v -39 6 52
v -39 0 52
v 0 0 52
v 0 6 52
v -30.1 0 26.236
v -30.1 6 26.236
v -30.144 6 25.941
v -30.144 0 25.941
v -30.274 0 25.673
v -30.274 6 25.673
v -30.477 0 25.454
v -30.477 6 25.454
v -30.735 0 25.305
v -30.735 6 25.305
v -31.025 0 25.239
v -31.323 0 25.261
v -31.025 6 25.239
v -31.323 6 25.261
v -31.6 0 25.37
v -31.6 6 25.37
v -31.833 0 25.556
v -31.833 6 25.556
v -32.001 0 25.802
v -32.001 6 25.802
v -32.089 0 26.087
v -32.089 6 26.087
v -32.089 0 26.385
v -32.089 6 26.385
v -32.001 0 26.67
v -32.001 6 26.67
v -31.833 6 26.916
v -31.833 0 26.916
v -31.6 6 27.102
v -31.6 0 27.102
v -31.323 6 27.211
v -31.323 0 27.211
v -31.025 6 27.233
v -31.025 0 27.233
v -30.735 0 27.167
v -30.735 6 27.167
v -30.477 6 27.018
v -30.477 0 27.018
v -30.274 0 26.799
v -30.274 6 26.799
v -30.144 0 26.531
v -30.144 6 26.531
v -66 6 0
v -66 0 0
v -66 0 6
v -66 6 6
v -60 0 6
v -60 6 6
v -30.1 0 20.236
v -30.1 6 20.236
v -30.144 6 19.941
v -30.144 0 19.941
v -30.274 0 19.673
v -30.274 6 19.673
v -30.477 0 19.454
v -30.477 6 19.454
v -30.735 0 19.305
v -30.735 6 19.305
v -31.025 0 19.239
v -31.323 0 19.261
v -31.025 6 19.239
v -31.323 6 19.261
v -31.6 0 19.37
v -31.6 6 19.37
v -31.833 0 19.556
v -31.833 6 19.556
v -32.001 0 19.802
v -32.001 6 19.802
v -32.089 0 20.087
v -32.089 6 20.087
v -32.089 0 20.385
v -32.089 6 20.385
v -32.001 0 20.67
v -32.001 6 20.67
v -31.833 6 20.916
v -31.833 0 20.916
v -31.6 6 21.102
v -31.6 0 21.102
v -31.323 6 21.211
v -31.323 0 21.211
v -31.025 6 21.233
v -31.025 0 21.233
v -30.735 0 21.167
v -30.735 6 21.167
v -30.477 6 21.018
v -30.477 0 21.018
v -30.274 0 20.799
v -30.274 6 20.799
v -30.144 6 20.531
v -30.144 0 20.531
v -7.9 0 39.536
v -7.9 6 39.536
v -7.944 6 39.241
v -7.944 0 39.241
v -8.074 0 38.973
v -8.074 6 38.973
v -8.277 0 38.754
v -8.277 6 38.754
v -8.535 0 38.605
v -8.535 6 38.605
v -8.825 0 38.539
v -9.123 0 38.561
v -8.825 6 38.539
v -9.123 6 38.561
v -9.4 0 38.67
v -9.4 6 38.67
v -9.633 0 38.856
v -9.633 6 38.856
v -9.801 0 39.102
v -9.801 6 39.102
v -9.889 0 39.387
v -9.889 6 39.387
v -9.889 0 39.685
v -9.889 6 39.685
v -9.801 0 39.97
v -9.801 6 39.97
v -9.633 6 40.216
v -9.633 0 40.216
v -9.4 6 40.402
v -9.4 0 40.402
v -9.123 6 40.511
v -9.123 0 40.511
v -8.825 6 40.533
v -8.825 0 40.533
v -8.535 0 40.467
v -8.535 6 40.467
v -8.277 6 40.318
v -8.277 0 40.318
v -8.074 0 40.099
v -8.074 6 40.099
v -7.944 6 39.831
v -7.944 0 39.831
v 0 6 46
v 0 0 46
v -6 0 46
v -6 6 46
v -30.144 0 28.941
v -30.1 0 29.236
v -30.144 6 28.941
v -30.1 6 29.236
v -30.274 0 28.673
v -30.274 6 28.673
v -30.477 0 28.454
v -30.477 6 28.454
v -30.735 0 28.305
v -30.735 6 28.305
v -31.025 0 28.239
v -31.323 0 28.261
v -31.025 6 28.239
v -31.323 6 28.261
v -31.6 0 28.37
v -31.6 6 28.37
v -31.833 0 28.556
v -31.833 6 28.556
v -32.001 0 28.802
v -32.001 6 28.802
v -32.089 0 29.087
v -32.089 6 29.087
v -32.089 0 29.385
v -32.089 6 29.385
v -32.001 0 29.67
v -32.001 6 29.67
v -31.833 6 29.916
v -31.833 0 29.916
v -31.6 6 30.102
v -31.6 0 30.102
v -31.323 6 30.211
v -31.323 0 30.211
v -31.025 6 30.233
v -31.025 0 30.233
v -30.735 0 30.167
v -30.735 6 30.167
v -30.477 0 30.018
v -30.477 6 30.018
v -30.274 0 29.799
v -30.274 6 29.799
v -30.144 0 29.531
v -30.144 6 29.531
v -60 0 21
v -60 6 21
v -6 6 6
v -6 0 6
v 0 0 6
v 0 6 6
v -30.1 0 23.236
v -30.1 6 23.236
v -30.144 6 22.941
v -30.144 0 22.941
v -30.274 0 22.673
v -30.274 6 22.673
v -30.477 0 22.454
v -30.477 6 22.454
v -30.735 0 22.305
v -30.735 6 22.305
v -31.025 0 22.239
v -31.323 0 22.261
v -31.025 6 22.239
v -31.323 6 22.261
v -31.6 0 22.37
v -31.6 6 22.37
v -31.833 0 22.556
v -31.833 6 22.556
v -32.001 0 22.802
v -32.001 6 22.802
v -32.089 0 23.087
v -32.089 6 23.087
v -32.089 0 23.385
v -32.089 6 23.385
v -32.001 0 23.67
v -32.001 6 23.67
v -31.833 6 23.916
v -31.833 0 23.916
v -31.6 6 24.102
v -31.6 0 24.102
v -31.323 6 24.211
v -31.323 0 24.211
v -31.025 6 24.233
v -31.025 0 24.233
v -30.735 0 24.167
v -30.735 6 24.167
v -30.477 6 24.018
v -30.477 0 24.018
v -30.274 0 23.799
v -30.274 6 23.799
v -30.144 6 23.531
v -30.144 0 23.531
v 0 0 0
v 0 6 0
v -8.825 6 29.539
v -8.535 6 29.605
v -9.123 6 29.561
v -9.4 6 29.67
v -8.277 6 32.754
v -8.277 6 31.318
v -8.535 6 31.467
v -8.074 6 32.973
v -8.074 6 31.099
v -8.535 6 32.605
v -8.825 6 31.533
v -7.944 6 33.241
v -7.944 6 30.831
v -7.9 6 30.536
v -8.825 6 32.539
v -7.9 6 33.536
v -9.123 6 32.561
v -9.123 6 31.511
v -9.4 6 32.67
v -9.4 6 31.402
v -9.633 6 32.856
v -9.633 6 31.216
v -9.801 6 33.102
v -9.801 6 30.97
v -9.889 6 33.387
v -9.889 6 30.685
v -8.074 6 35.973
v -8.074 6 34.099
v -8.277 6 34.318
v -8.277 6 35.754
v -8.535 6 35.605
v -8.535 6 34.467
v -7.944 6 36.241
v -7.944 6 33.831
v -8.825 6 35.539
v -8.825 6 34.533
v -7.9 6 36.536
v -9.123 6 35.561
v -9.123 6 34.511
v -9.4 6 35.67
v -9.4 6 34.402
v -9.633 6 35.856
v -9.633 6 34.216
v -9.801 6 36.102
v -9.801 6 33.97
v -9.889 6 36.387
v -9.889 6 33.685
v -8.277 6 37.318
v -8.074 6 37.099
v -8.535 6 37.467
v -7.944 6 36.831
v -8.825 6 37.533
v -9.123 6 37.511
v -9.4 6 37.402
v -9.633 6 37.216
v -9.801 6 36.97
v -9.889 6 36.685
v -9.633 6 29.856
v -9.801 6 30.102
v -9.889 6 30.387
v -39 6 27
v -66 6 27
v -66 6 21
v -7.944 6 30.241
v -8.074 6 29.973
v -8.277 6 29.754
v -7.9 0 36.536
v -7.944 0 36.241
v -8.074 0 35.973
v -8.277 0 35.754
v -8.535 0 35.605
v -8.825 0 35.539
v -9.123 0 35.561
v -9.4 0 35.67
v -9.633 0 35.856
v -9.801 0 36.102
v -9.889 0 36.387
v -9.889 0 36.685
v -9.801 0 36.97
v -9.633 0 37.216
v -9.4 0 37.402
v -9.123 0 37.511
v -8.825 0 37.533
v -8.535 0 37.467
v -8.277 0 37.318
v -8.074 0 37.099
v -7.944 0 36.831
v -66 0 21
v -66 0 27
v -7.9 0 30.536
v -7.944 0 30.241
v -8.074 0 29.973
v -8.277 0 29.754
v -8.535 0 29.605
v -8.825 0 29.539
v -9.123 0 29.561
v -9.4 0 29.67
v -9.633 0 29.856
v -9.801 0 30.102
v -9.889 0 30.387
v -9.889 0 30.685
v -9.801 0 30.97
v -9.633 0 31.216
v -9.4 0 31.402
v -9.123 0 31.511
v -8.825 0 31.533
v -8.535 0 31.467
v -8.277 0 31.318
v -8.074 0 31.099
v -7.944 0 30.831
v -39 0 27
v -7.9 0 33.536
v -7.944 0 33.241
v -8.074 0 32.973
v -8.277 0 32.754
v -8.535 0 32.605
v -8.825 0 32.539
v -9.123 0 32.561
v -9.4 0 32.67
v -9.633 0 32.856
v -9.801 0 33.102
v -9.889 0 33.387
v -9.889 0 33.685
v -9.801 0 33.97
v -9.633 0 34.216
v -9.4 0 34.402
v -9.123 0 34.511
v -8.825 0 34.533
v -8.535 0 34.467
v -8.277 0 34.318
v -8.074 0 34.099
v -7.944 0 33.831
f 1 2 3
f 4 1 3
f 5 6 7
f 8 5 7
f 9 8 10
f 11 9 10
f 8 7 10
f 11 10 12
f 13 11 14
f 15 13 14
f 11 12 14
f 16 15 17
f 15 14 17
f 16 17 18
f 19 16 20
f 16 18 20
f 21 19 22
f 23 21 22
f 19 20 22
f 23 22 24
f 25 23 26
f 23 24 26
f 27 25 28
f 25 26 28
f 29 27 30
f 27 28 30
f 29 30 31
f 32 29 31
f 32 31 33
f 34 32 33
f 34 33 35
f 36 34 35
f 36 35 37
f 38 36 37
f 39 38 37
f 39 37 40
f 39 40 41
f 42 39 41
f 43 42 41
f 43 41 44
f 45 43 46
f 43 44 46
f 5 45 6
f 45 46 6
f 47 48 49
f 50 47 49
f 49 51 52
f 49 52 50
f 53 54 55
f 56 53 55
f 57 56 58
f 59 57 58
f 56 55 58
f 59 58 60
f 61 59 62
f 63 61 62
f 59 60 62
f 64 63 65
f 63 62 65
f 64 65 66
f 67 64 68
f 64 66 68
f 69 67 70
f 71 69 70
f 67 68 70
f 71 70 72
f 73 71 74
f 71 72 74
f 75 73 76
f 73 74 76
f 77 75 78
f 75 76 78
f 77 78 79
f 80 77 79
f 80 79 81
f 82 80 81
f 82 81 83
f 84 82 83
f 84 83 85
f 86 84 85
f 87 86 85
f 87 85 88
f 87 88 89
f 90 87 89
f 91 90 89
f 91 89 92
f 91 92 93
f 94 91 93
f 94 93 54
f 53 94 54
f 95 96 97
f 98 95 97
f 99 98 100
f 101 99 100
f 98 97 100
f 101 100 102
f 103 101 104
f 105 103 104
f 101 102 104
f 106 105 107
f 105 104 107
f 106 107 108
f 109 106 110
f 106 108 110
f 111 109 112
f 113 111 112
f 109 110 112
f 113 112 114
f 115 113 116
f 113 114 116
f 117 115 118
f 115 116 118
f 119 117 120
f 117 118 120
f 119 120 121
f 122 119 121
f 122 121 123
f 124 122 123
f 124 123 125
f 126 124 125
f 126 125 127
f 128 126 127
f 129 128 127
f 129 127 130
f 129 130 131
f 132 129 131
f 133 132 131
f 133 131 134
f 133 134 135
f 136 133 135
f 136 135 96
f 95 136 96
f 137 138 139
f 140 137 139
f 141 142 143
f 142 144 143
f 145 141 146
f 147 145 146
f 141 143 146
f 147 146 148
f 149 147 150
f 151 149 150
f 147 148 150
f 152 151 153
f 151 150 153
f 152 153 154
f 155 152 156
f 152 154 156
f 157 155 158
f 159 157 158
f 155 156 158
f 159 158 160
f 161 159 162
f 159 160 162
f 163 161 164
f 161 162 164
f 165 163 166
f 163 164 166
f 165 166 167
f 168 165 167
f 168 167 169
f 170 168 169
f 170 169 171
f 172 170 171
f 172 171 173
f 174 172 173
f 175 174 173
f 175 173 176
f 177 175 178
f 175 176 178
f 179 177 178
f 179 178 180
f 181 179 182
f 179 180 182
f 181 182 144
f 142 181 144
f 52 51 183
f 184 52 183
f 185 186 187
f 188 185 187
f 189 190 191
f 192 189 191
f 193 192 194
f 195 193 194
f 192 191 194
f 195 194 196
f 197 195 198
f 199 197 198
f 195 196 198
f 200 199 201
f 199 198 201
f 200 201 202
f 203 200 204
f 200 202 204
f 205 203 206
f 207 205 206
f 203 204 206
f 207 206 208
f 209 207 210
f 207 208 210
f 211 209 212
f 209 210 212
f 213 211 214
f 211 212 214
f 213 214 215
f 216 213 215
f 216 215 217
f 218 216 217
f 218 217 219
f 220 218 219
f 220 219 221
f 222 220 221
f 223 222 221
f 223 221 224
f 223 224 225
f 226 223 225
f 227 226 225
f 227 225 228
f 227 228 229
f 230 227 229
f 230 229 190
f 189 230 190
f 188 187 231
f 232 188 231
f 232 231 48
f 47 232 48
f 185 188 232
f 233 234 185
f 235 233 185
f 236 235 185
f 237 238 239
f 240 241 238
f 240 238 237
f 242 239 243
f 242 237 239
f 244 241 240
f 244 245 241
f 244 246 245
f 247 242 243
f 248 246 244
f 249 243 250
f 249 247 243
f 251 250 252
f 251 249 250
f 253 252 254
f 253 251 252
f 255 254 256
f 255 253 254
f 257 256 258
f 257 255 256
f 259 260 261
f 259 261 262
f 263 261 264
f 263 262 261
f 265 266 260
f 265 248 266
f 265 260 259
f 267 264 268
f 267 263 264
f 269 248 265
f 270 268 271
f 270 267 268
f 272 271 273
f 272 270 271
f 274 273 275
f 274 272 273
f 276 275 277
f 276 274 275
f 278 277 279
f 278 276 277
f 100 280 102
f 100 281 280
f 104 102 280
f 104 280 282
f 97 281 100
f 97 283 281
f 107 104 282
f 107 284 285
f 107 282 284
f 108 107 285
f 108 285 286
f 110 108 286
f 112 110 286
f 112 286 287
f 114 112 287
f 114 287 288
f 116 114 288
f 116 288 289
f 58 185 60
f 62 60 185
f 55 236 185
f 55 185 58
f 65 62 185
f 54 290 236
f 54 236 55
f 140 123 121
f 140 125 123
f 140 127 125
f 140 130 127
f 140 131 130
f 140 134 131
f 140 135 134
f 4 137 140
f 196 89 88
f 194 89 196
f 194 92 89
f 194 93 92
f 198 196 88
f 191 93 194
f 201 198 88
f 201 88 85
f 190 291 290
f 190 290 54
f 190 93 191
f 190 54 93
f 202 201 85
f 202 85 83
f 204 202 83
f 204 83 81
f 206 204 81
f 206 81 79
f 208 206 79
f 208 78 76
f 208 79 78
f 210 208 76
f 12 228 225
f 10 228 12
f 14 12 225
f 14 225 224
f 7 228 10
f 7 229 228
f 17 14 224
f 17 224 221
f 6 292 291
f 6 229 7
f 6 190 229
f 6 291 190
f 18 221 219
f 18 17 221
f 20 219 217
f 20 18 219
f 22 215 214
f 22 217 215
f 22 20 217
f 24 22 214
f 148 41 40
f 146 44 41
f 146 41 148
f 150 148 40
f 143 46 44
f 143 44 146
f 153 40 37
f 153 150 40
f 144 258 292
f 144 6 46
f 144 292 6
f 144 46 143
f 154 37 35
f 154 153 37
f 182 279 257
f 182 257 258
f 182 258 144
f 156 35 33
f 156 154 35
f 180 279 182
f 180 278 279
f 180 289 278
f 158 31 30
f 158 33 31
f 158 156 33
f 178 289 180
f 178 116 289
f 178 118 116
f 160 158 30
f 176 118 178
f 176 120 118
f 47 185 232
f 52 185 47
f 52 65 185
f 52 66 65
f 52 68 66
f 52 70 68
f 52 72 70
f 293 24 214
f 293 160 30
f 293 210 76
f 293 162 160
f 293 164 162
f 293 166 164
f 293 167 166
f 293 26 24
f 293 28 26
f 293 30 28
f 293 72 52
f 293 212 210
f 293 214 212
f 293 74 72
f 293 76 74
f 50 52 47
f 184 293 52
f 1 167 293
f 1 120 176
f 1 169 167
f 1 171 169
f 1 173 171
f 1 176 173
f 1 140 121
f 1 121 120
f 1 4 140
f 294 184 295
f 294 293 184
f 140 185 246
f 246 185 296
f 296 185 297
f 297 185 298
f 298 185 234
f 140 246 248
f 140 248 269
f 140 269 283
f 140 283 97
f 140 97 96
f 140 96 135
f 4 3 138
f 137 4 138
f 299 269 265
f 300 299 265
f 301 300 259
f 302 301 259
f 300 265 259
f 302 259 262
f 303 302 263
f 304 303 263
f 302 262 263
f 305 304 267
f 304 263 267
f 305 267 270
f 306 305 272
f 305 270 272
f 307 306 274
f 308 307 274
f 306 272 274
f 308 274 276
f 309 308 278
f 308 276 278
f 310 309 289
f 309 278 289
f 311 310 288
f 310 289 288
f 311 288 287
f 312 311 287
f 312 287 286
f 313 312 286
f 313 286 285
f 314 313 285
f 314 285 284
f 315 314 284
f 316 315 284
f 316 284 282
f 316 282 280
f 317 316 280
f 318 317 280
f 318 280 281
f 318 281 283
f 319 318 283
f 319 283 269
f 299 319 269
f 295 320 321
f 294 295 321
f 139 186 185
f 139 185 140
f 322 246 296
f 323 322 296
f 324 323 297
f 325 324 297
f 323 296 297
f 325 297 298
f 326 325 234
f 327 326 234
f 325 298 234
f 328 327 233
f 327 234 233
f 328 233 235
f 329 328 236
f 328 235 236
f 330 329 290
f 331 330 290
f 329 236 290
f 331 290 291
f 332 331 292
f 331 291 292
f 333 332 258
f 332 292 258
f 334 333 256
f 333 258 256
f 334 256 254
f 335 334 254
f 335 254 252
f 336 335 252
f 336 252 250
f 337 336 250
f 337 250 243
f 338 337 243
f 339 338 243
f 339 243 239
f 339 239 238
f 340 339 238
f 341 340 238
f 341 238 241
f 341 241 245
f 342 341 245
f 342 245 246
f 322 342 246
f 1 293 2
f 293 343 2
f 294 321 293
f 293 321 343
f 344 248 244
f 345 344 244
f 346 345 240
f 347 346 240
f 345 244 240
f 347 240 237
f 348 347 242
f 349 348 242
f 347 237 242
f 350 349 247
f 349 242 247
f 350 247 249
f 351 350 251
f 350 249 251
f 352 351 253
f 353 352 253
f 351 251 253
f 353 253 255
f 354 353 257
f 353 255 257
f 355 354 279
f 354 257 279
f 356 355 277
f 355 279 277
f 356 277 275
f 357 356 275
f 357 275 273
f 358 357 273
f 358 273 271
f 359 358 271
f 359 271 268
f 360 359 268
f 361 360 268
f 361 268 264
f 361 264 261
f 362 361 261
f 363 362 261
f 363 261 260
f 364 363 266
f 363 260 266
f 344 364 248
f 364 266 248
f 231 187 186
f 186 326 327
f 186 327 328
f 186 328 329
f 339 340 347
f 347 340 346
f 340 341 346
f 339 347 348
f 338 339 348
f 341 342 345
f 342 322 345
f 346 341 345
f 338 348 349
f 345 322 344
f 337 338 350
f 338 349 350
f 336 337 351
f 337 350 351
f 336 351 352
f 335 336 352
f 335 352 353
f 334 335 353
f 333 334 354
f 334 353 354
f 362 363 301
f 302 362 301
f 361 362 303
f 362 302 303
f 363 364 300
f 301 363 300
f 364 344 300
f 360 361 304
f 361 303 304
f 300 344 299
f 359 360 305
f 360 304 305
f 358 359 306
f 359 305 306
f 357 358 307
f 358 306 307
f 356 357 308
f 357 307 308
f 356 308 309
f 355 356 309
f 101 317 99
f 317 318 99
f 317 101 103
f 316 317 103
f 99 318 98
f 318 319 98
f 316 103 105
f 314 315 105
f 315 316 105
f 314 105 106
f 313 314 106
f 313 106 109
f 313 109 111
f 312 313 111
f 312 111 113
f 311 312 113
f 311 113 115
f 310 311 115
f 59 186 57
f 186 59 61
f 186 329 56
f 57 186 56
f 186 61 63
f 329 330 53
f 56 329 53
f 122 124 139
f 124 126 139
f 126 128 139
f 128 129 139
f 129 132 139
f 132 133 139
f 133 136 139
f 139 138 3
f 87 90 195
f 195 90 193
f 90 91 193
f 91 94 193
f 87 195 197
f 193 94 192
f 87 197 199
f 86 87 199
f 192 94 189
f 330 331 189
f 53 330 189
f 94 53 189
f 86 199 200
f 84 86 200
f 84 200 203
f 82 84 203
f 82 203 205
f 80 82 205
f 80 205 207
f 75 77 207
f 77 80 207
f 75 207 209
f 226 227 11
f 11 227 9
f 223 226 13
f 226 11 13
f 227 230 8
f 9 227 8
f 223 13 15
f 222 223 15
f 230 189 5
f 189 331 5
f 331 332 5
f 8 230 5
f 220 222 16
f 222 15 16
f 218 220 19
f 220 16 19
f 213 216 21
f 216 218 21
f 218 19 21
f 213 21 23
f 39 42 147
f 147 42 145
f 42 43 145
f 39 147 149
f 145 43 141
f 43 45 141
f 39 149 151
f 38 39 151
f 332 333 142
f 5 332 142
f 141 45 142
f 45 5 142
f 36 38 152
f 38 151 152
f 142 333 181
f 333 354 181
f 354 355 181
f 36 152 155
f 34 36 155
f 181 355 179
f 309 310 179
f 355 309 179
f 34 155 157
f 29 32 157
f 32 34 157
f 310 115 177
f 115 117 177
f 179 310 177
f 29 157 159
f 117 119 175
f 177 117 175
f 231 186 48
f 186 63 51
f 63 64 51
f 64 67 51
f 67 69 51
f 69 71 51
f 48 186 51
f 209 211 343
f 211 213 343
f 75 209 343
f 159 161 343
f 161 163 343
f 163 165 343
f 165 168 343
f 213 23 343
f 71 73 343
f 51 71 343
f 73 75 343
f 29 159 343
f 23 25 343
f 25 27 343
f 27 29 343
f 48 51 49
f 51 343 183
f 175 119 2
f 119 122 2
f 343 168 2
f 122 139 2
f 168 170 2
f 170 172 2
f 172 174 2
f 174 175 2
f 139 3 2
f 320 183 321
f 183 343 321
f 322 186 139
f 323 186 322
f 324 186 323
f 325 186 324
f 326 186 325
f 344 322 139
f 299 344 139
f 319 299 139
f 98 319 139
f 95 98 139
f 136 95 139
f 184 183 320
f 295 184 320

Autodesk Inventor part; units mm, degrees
ref_plane "YZ Plane" through (0, 0, 0) normal (1, 0, 0) x (0, 1, 0)
ref_plane "XZ Plane" through (0, 0, 0) normal (0, 1, 0) x (-1, 0, 0)
ref_plane "XY Plane" through (0, 0, 0) normal (0, 0, 1) x (1, 0, 0)
sketch "Sketch1" plane through (0, 0, 0) normal (0, 1, 0) x (-1, 0, 0)
  line L0 (0, 0) -> (60, 0)
  line L1 (66, 0) -> (66, 6)
  line L2 (66, 27) -> (60, 27)
  line L3 (0, 27) -> (0, 6) construction
  line L4 (66, 27) -> (60, 27)
  line L5 (60, 27) -> (60, 21) construction
  line L6 (60, 21) -> (66, 21)
  line L7 (66, 21) -> (66, 27)
  line L8 (66, 0) -> (60, 0)
  line L9 (60, 0) -> (60, 6) construction
  line L10 (60, 6) -> (66, 6)
  line L11 (66, 6) -> (66, 0)
  line L12 (66, 21) -> (66, 27)
  line L13 (60, 27) -> (6, 27)
  line L14 (60, 0) -> (66, 0)
  line L15 (66, 6) -> (66, 21) construction
  line L16 (60, 6) -> (60, 21)
  line L17 (0, 0) -> (6, 0)
  line L18 (6, 0) -> (6, 6) construction
  line L19 (6, 6) -> (0, 6)
  line L20 (0, 6) -> (0, 0)
  line L21 (6, 6) -> (6, 27)
  line L22 (6, 27) -> (0, 27) construction
  line L23 (0, 6) -> (0, 0)
  line L24 (6, 27) -> (39, 27)
  line L25 (39, 27) -> (39, 52)
  line L26 (39, 52) -> (6, 52)
  line L27 (6, 52) -> (0, 52)
  line L28 (0, 52) -> (0, 46)
  line L29 (0, 46) -> (6, 46)
  line L30 (6, 46) -> (6, 52) construction
  line L31 (6, 46) -> (6, 27)
  dimension "d0" = 66
  dimension "d1" = 27
  dimension "d2" = 6
  dimension "d3" = 6
  dimension "d4" = 6
  dimension "d5" = 6
  dimension "d6" = 6
  dimension "d7" = 6
  dimension "d10" = 33
  dimension "d11" = 25
  dimension "d12" = 6
  dimension "d13" = 6
extrude "Extrusion1" add sketch "Sketch1" along normal blind 6
sketch "Sketch2" plane through (0, 6, 0) normal (0, 1, 0) x (1, 0, 0)
  circle A0 centre (-8.9, -39.536) radius 1
  line L0 (0, -46) -> (-6, -46) projected
  line L1 (-6, -46) -> (-6, -6) projected
  circle A1 centre (-31.1, -29.236) radius 1
  circle A2 centre (-8.9, -36.536) radius 1
  circle A3 centre (-8.9, -33.536) radius 1
  circle A4 centre (-8.9, -30.536) radius 1
  circle A5 centre (-31.1, -26.236) radius 1
  circle A6 centre (-31.1, -23.236) radius 1
  circle A7 centre (-31.1, -20.236) radius 1
  point P0 (0, 0)
  dimension "d14" = 2
  dimension "d15" = 6.464
  dimension "d16" = 2.9
  dimension "d19" = 2
  dimension "d20" = 22.2
  dimension "d21" = 10.3
  dimension "d22" = 2
  dimension "d23" = 3
  dimension "d24" = 2
  dimension "d25" = 3
  dimension "d26" = 2
  dimension "d27" = 3
  dimension "d28" = 2
  dimension "d29" = 2
  dimension "d30" = 3
  dimension "d31" = 2
  dimension "d32" = 3
  dimension "d33" = 3
extrude "Extrusion2" cut sketch "Sketch2" against normal through all
properties part number "thumper-bumper-sidewall3-v2"
